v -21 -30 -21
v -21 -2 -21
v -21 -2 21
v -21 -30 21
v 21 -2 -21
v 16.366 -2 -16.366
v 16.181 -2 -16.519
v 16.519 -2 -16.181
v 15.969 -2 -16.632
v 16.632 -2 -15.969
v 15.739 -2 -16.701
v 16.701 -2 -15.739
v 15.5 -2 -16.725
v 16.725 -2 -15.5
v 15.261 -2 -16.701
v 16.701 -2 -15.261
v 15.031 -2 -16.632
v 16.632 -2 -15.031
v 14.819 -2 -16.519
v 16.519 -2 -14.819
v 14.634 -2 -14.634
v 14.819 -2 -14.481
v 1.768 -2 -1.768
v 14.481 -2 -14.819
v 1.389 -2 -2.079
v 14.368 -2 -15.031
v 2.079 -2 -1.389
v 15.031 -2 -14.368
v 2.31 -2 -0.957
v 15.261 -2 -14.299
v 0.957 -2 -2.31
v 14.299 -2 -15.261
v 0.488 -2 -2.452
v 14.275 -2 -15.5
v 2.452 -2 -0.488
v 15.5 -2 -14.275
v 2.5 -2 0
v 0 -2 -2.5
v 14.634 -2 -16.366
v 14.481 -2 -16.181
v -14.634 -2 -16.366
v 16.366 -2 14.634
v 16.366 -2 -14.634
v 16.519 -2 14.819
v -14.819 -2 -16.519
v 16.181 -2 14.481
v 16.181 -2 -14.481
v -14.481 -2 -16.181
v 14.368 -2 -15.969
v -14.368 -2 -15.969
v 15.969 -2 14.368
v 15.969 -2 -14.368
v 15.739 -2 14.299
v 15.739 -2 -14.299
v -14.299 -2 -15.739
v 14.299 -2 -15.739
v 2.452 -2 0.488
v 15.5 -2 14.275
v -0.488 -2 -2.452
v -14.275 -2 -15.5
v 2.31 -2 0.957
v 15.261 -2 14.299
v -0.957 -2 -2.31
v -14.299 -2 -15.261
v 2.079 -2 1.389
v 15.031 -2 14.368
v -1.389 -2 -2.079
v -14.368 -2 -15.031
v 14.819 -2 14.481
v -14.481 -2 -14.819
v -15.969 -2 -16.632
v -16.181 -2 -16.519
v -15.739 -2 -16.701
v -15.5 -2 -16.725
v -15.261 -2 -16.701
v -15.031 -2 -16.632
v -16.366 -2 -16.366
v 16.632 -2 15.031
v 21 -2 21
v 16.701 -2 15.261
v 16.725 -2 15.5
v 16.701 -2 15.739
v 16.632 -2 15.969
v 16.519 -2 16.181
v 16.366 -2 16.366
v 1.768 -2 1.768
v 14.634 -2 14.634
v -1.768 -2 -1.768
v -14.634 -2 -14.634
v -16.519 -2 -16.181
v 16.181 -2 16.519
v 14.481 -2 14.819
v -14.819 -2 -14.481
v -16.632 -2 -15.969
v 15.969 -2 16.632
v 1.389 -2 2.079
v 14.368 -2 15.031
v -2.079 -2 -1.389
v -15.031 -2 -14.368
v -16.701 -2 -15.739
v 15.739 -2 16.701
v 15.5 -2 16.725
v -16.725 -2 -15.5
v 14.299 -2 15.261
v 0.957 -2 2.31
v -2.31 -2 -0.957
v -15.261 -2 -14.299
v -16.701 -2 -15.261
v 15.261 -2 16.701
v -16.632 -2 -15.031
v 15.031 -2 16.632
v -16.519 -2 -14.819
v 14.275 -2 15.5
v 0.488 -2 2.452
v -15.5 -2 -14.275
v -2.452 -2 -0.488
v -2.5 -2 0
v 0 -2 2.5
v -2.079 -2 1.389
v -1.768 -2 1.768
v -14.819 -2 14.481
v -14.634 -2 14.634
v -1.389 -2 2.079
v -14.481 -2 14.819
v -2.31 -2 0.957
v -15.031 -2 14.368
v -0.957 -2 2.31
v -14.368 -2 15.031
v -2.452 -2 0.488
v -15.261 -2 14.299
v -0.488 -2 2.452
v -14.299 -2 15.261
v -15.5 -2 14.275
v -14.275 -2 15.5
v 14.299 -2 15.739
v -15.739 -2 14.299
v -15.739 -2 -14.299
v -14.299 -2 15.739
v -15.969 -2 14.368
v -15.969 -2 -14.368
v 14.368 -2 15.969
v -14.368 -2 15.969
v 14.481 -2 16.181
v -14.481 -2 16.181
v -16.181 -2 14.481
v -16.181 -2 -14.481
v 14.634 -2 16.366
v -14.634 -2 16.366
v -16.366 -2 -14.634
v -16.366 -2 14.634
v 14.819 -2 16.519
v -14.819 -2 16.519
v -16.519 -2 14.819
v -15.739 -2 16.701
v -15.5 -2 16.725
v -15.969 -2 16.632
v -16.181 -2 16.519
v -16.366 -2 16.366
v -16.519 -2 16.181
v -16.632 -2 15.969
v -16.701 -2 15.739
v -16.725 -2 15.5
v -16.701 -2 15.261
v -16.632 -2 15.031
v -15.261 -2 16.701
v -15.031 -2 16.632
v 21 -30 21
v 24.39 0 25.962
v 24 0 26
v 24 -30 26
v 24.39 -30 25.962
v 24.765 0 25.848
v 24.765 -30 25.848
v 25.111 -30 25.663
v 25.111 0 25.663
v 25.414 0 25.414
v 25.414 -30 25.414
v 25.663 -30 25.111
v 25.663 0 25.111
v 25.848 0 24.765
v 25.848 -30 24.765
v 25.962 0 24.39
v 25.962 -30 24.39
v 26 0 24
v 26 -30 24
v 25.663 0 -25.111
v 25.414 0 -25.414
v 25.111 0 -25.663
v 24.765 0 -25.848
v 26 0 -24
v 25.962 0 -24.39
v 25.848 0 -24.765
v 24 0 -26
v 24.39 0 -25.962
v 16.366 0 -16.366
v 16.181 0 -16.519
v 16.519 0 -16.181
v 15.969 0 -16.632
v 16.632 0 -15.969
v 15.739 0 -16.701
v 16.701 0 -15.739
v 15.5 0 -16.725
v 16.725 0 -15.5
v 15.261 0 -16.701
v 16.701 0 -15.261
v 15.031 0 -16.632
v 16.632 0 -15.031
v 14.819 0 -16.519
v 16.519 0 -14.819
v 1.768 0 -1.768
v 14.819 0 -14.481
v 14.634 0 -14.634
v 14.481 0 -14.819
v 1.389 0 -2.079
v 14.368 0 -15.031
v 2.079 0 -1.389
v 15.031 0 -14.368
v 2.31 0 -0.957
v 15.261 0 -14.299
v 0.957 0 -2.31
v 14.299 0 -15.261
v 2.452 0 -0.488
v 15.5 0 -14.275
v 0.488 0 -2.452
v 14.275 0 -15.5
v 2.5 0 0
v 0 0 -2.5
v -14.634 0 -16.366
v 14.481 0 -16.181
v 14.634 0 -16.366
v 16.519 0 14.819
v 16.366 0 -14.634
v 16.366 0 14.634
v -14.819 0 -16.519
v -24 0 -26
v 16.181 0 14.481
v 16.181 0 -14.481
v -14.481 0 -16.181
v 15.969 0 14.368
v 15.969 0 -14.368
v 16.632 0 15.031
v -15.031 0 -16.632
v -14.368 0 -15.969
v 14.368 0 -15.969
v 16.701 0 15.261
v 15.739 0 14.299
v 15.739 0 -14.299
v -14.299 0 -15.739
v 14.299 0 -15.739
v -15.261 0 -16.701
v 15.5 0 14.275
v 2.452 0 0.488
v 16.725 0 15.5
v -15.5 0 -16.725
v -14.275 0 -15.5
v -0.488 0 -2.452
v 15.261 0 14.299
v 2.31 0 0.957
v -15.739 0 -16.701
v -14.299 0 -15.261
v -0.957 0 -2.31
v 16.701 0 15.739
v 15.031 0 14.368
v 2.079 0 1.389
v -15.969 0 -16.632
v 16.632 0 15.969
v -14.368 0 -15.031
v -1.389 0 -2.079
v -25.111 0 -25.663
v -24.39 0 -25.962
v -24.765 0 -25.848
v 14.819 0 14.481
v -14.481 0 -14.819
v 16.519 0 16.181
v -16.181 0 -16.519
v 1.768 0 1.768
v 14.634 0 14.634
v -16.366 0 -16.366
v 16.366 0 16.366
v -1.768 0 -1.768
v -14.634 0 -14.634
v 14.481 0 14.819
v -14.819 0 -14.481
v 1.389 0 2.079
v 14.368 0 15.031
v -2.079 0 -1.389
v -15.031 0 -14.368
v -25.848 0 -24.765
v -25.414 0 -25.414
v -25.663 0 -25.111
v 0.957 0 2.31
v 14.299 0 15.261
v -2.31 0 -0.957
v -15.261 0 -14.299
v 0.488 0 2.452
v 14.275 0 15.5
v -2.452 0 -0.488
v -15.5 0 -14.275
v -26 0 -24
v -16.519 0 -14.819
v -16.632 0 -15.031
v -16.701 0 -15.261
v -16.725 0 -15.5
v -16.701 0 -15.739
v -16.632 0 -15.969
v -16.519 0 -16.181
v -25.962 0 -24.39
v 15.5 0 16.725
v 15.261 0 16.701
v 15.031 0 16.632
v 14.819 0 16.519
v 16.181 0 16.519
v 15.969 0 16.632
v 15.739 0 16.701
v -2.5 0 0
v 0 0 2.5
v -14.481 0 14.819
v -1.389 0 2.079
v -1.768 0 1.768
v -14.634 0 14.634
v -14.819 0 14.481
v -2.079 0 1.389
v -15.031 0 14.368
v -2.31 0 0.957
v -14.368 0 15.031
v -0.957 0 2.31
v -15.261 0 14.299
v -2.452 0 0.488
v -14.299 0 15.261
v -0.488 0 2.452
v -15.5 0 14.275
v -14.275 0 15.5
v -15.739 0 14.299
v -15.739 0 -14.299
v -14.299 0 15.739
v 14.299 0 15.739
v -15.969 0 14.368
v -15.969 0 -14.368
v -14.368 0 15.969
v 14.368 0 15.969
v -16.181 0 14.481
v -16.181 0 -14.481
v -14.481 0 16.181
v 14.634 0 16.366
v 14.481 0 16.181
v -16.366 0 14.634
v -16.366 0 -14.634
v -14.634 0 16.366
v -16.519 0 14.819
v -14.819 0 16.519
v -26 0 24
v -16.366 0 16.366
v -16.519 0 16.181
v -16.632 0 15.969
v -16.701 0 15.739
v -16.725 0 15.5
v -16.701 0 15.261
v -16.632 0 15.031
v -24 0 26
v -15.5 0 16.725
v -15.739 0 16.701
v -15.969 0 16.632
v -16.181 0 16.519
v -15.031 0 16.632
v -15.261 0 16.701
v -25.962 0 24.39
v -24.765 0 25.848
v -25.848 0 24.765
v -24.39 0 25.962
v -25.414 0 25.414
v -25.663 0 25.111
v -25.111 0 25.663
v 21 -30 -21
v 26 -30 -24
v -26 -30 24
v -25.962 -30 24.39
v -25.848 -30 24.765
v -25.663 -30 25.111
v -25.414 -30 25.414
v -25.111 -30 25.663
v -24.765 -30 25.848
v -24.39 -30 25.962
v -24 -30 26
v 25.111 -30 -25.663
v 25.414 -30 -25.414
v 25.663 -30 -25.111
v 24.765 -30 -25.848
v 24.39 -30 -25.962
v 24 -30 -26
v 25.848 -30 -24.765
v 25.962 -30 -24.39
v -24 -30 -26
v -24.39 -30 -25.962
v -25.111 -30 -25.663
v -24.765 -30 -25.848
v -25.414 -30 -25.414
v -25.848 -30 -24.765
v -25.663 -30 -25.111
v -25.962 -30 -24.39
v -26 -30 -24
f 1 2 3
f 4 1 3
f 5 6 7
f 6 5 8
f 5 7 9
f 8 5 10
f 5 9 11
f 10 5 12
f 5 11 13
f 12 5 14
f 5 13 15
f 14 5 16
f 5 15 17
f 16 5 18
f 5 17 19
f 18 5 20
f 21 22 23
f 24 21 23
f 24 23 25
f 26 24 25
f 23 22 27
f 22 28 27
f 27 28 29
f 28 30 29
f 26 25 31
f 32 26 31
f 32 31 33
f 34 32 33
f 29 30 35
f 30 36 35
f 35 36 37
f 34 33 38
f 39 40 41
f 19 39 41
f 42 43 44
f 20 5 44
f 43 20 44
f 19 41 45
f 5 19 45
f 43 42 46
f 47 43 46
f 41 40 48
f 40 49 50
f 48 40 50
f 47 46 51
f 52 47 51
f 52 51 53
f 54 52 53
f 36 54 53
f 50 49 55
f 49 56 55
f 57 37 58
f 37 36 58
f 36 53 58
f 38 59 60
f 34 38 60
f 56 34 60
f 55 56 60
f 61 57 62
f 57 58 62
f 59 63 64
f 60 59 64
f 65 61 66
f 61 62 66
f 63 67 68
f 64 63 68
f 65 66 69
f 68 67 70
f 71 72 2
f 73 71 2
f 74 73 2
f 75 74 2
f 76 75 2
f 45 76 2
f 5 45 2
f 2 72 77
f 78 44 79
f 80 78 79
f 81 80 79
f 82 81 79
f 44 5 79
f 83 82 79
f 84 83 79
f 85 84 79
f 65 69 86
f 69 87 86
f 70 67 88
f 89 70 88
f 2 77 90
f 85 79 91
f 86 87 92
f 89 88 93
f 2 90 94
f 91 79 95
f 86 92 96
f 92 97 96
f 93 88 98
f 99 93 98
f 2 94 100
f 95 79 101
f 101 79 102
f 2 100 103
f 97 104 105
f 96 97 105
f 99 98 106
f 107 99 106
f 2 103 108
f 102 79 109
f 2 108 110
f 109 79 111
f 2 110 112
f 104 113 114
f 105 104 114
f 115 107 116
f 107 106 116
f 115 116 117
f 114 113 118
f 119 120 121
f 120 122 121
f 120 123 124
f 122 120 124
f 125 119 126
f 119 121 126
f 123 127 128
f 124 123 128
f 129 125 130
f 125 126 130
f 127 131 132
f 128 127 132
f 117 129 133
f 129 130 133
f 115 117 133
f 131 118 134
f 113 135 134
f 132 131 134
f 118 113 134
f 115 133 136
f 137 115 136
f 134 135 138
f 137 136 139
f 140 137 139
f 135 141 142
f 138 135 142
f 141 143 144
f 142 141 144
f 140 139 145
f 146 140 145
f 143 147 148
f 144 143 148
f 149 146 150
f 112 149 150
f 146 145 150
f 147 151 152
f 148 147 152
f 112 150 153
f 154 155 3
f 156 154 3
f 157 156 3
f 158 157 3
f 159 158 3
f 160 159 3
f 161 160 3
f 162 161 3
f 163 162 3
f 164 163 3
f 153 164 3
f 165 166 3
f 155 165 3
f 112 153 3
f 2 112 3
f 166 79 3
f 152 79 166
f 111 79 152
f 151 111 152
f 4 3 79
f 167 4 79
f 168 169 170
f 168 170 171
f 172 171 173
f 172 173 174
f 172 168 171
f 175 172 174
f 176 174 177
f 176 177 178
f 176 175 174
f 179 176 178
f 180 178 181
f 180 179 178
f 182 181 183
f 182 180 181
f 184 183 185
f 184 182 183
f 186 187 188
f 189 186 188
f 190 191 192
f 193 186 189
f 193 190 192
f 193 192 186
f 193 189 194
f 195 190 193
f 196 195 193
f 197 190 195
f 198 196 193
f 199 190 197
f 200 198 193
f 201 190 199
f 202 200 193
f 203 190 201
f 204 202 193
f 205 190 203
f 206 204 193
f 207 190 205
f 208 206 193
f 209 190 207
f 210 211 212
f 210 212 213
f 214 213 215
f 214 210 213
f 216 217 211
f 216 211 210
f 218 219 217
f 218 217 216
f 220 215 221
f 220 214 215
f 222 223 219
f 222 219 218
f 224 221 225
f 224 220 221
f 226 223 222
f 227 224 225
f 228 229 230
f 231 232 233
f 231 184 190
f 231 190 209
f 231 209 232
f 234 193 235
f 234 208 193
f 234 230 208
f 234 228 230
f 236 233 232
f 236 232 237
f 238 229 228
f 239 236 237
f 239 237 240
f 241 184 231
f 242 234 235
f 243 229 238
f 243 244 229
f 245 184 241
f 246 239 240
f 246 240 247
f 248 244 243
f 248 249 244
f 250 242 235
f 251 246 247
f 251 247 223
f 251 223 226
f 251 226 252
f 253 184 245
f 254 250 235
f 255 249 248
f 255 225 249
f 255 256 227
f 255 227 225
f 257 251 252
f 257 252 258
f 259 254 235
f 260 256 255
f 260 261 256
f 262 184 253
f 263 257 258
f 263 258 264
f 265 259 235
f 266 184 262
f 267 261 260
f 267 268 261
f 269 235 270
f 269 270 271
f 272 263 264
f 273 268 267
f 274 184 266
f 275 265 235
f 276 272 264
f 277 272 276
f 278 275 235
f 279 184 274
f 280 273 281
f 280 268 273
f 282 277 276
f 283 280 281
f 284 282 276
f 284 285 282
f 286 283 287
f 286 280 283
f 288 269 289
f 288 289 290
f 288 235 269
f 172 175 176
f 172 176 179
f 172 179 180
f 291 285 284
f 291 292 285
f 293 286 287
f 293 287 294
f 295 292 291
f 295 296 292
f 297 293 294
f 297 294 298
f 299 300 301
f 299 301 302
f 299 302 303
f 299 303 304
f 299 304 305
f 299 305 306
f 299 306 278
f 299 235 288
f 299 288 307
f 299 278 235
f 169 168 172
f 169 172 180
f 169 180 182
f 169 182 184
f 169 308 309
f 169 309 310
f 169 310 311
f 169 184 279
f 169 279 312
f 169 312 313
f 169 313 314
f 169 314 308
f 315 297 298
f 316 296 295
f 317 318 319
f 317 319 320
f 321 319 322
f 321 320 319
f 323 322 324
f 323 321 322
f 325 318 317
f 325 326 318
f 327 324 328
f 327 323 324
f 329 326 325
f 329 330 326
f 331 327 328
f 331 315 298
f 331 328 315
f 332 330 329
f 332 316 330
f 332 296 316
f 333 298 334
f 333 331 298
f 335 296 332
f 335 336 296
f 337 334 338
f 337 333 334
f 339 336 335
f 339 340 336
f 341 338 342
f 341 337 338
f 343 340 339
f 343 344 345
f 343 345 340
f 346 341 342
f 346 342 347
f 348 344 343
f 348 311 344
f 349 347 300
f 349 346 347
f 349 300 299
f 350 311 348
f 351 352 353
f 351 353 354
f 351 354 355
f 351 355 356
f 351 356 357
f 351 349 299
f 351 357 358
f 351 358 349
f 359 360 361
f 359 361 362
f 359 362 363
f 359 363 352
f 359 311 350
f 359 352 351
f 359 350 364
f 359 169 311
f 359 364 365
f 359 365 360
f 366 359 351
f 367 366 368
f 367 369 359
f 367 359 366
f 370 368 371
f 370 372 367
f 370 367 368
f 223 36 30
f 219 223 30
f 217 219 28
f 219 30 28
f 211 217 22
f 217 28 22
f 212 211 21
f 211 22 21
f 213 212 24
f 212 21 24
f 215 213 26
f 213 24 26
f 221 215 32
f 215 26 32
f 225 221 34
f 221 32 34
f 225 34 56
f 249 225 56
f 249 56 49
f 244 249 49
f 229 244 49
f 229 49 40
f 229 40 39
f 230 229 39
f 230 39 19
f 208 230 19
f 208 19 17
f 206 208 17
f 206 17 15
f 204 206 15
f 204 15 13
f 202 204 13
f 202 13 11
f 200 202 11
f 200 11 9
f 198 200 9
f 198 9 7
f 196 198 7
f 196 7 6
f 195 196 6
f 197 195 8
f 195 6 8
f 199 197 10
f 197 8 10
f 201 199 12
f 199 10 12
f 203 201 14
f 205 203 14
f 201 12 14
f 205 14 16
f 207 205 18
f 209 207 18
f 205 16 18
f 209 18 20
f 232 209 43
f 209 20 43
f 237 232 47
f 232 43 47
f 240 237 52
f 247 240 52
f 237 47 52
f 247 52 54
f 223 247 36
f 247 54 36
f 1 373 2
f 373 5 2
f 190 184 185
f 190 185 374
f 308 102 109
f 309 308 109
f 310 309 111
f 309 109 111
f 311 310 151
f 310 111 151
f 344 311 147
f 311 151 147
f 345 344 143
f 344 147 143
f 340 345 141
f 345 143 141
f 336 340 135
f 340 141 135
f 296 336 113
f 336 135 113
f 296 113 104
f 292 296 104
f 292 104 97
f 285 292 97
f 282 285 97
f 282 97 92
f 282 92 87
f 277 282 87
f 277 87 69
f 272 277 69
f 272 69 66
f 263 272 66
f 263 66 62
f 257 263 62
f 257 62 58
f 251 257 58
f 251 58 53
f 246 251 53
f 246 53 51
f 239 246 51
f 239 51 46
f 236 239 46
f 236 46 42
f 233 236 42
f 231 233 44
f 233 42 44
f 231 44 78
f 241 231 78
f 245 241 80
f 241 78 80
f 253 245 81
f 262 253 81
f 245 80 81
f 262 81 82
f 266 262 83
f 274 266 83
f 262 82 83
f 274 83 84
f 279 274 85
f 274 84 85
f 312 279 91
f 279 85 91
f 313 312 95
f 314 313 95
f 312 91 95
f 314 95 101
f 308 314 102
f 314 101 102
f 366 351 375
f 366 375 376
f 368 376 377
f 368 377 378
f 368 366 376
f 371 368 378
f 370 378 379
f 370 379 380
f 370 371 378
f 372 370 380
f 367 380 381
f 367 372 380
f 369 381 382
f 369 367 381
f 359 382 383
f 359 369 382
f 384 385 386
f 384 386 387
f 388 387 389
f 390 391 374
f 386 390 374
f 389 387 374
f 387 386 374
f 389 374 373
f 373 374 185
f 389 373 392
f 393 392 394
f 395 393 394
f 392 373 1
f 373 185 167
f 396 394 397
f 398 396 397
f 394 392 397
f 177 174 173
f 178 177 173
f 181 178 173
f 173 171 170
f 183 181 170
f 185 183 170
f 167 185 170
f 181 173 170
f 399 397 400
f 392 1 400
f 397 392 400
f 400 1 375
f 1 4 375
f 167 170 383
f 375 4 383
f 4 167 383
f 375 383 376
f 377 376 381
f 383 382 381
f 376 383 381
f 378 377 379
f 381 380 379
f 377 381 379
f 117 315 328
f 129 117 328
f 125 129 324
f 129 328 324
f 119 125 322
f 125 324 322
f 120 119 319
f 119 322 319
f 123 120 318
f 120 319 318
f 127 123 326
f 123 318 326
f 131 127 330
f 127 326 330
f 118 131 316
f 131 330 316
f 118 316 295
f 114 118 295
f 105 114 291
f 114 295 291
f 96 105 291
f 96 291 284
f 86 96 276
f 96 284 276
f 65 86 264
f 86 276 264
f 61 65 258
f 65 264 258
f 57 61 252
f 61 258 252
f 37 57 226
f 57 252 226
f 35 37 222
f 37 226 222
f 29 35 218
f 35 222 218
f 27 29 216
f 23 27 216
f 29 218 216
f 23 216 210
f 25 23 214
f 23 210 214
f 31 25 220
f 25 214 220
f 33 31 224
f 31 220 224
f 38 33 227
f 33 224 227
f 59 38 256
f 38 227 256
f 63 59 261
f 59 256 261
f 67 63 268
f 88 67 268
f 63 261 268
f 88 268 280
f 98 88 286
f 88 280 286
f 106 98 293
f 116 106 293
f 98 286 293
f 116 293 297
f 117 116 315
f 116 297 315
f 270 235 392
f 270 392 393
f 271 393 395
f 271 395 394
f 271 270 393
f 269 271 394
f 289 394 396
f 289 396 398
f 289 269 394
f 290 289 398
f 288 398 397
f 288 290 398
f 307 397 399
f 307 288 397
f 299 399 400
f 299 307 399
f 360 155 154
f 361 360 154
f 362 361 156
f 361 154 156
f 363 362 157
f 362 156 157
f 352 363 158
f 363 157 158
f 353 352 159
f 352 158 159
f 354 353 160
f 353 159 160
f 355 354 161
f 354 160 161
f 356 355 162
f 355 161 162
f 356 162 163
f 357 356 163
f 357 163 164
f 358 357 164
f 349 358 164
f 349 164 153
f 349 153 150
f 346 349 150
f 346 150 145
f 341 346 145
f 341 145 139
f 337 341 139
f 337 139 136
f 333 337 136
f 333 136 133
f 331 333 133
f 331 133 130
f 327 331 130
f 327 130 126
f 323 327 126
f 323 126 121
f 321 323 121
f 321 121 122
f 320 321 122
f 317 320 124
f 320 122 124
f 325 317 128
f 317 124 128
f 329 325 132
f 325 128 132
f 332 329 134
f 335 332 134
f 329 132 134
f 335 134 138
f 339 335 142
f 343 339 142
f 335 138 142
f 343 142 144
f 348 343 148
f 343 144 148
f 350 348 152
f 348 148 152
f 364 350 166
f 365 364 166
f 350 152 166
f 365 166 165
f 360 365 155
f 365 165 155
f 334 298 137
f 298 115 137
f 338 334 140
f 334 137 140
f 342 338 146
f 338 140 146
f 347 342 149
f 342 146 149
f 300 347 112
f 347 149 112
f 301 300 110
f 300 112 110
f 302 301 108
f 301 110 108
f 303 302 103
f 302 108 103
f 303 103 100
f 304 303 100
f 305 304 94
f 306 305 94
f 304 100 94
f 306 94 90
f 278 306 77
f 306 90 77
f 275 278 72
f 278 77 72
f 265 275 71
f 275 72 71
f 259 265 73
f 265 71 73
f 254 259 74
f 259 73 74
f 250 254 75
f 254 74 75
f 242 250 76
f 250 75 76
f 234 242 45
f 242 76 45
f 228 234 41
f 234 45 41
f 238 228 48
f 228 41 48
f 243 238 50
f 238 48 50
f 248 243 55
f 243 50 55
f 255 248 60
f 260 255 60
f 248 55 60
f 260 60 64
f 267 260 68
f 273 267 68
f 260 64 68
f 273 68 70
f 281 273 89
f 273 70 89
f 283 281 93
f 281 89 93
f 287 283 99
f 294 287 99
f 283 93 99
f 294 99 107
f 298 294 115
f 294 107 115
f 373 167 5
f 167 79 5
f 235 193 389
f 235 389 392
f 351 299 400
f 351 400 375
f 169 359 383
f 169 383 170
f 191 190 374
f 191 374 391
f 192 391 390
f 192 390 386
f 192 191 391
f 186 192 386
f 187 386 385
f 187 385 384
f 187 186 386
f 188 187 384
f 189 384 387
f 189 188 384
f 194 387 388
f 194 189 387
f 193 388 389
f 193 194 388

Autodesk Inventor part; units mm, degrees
ref_plane "YZ Plane" through (0, 0, 0) normal (1, 0, 0) x (0, 1, 0)
ref_plane "XZ Plane" through (0, 0, 0) normal (0, 1, 0) x (-1, 0, 0)
ref_plane "XY Plane" through (0, 0, 0) normal (0, 0, 1) x (1, 0, 0)
sketch "Sketch1" plane through (0, 0, 0) normal (0, 1, 0) x (-1, 0, 0)
  line L0 (15.5, 15.5) -> (-15.5, 15.5)
  line L1 (-15.5, 15.5) -> (-15.5, -15.5)
  line L2 (-15.5, -15.5) -> (15.5, -15.5)
  line L3 (15.5, -15.5) -> (15.5, 15.5)
  line L4 (15.5, 15.5) -> (-15.5, -15.5) construction
  line L5 (-15.5, 15.5) -> (15.5, -15.5) construction
  line L6 (21, 21) -> (-21, 21)
  line L7 (-21, 21) -> (-21, -21)
  line L8 (-21, -21) -> (21, -21)
  line L9 (21, -21) -> (21, 21)
  line L10 (21, 21) -> (-21, -21) construction
  line L11 (-21, 21) -> (21, -21) construction
  line L12 (24, 26) -> (-24, 26)
  line L13 (-26, 24) -> (-26, -24)
  line L14 (-24, -26) -> (24, -26)
  line L15 (26, -24) -> (26, 24)
  circle A0 centre (0, 0) radius 2.5
  arc A1 (26, 24) -> (24, 26) centre (24, 24) ccw
  arc A2 (-24, 26) -> (-26, 24) centre (-24, 24) ccw
  arc A3 (24, -26) -> (26, -24) centre (24, -24) ccw
  arc A4 (-26, -24) -> (-24, -26) centre (-24, -24) ccw
  point P0 (26, 26)
  point P1 (-26, 26)
  point P2 (-26, -26)
  point P3 (26, -26)
  dimension "d0" = 31
  dimension "d1" = 31
  dimension "d2" = 42
  dimension "d3" = 42
  dimension "d4" = 5
  dimension "d7" = 5
  dimension "d23" = 2
extrude "Extrusion1" add sketch "Sketch1" against normal blind 2 contours L3 L2 L1 L0 | L9 L8 L7 L6 | A0
extrude "Extrusion2" add sketch "Sketch1" against normal blind 30 contours A1 L15 A3 L14 A4 L13 A2 L12
hole "Hole1" at (-15.5, 0, -15.5) at (-15.5, 0, 15.5) at (15.5, 0, 15.5) at (15.5, 0, -15.5) direction (0, -1, 0) diameter 2.45 end through all
thread "Thread2" size "M2.5x0.45" class "6H" standard "ANSI Metric M Profile" full length
extrude "Extrusion3" cut sketch "Sketch1" against normal up to surface (2 mm away) contours A0
properties part number "turnmotorcasing"
